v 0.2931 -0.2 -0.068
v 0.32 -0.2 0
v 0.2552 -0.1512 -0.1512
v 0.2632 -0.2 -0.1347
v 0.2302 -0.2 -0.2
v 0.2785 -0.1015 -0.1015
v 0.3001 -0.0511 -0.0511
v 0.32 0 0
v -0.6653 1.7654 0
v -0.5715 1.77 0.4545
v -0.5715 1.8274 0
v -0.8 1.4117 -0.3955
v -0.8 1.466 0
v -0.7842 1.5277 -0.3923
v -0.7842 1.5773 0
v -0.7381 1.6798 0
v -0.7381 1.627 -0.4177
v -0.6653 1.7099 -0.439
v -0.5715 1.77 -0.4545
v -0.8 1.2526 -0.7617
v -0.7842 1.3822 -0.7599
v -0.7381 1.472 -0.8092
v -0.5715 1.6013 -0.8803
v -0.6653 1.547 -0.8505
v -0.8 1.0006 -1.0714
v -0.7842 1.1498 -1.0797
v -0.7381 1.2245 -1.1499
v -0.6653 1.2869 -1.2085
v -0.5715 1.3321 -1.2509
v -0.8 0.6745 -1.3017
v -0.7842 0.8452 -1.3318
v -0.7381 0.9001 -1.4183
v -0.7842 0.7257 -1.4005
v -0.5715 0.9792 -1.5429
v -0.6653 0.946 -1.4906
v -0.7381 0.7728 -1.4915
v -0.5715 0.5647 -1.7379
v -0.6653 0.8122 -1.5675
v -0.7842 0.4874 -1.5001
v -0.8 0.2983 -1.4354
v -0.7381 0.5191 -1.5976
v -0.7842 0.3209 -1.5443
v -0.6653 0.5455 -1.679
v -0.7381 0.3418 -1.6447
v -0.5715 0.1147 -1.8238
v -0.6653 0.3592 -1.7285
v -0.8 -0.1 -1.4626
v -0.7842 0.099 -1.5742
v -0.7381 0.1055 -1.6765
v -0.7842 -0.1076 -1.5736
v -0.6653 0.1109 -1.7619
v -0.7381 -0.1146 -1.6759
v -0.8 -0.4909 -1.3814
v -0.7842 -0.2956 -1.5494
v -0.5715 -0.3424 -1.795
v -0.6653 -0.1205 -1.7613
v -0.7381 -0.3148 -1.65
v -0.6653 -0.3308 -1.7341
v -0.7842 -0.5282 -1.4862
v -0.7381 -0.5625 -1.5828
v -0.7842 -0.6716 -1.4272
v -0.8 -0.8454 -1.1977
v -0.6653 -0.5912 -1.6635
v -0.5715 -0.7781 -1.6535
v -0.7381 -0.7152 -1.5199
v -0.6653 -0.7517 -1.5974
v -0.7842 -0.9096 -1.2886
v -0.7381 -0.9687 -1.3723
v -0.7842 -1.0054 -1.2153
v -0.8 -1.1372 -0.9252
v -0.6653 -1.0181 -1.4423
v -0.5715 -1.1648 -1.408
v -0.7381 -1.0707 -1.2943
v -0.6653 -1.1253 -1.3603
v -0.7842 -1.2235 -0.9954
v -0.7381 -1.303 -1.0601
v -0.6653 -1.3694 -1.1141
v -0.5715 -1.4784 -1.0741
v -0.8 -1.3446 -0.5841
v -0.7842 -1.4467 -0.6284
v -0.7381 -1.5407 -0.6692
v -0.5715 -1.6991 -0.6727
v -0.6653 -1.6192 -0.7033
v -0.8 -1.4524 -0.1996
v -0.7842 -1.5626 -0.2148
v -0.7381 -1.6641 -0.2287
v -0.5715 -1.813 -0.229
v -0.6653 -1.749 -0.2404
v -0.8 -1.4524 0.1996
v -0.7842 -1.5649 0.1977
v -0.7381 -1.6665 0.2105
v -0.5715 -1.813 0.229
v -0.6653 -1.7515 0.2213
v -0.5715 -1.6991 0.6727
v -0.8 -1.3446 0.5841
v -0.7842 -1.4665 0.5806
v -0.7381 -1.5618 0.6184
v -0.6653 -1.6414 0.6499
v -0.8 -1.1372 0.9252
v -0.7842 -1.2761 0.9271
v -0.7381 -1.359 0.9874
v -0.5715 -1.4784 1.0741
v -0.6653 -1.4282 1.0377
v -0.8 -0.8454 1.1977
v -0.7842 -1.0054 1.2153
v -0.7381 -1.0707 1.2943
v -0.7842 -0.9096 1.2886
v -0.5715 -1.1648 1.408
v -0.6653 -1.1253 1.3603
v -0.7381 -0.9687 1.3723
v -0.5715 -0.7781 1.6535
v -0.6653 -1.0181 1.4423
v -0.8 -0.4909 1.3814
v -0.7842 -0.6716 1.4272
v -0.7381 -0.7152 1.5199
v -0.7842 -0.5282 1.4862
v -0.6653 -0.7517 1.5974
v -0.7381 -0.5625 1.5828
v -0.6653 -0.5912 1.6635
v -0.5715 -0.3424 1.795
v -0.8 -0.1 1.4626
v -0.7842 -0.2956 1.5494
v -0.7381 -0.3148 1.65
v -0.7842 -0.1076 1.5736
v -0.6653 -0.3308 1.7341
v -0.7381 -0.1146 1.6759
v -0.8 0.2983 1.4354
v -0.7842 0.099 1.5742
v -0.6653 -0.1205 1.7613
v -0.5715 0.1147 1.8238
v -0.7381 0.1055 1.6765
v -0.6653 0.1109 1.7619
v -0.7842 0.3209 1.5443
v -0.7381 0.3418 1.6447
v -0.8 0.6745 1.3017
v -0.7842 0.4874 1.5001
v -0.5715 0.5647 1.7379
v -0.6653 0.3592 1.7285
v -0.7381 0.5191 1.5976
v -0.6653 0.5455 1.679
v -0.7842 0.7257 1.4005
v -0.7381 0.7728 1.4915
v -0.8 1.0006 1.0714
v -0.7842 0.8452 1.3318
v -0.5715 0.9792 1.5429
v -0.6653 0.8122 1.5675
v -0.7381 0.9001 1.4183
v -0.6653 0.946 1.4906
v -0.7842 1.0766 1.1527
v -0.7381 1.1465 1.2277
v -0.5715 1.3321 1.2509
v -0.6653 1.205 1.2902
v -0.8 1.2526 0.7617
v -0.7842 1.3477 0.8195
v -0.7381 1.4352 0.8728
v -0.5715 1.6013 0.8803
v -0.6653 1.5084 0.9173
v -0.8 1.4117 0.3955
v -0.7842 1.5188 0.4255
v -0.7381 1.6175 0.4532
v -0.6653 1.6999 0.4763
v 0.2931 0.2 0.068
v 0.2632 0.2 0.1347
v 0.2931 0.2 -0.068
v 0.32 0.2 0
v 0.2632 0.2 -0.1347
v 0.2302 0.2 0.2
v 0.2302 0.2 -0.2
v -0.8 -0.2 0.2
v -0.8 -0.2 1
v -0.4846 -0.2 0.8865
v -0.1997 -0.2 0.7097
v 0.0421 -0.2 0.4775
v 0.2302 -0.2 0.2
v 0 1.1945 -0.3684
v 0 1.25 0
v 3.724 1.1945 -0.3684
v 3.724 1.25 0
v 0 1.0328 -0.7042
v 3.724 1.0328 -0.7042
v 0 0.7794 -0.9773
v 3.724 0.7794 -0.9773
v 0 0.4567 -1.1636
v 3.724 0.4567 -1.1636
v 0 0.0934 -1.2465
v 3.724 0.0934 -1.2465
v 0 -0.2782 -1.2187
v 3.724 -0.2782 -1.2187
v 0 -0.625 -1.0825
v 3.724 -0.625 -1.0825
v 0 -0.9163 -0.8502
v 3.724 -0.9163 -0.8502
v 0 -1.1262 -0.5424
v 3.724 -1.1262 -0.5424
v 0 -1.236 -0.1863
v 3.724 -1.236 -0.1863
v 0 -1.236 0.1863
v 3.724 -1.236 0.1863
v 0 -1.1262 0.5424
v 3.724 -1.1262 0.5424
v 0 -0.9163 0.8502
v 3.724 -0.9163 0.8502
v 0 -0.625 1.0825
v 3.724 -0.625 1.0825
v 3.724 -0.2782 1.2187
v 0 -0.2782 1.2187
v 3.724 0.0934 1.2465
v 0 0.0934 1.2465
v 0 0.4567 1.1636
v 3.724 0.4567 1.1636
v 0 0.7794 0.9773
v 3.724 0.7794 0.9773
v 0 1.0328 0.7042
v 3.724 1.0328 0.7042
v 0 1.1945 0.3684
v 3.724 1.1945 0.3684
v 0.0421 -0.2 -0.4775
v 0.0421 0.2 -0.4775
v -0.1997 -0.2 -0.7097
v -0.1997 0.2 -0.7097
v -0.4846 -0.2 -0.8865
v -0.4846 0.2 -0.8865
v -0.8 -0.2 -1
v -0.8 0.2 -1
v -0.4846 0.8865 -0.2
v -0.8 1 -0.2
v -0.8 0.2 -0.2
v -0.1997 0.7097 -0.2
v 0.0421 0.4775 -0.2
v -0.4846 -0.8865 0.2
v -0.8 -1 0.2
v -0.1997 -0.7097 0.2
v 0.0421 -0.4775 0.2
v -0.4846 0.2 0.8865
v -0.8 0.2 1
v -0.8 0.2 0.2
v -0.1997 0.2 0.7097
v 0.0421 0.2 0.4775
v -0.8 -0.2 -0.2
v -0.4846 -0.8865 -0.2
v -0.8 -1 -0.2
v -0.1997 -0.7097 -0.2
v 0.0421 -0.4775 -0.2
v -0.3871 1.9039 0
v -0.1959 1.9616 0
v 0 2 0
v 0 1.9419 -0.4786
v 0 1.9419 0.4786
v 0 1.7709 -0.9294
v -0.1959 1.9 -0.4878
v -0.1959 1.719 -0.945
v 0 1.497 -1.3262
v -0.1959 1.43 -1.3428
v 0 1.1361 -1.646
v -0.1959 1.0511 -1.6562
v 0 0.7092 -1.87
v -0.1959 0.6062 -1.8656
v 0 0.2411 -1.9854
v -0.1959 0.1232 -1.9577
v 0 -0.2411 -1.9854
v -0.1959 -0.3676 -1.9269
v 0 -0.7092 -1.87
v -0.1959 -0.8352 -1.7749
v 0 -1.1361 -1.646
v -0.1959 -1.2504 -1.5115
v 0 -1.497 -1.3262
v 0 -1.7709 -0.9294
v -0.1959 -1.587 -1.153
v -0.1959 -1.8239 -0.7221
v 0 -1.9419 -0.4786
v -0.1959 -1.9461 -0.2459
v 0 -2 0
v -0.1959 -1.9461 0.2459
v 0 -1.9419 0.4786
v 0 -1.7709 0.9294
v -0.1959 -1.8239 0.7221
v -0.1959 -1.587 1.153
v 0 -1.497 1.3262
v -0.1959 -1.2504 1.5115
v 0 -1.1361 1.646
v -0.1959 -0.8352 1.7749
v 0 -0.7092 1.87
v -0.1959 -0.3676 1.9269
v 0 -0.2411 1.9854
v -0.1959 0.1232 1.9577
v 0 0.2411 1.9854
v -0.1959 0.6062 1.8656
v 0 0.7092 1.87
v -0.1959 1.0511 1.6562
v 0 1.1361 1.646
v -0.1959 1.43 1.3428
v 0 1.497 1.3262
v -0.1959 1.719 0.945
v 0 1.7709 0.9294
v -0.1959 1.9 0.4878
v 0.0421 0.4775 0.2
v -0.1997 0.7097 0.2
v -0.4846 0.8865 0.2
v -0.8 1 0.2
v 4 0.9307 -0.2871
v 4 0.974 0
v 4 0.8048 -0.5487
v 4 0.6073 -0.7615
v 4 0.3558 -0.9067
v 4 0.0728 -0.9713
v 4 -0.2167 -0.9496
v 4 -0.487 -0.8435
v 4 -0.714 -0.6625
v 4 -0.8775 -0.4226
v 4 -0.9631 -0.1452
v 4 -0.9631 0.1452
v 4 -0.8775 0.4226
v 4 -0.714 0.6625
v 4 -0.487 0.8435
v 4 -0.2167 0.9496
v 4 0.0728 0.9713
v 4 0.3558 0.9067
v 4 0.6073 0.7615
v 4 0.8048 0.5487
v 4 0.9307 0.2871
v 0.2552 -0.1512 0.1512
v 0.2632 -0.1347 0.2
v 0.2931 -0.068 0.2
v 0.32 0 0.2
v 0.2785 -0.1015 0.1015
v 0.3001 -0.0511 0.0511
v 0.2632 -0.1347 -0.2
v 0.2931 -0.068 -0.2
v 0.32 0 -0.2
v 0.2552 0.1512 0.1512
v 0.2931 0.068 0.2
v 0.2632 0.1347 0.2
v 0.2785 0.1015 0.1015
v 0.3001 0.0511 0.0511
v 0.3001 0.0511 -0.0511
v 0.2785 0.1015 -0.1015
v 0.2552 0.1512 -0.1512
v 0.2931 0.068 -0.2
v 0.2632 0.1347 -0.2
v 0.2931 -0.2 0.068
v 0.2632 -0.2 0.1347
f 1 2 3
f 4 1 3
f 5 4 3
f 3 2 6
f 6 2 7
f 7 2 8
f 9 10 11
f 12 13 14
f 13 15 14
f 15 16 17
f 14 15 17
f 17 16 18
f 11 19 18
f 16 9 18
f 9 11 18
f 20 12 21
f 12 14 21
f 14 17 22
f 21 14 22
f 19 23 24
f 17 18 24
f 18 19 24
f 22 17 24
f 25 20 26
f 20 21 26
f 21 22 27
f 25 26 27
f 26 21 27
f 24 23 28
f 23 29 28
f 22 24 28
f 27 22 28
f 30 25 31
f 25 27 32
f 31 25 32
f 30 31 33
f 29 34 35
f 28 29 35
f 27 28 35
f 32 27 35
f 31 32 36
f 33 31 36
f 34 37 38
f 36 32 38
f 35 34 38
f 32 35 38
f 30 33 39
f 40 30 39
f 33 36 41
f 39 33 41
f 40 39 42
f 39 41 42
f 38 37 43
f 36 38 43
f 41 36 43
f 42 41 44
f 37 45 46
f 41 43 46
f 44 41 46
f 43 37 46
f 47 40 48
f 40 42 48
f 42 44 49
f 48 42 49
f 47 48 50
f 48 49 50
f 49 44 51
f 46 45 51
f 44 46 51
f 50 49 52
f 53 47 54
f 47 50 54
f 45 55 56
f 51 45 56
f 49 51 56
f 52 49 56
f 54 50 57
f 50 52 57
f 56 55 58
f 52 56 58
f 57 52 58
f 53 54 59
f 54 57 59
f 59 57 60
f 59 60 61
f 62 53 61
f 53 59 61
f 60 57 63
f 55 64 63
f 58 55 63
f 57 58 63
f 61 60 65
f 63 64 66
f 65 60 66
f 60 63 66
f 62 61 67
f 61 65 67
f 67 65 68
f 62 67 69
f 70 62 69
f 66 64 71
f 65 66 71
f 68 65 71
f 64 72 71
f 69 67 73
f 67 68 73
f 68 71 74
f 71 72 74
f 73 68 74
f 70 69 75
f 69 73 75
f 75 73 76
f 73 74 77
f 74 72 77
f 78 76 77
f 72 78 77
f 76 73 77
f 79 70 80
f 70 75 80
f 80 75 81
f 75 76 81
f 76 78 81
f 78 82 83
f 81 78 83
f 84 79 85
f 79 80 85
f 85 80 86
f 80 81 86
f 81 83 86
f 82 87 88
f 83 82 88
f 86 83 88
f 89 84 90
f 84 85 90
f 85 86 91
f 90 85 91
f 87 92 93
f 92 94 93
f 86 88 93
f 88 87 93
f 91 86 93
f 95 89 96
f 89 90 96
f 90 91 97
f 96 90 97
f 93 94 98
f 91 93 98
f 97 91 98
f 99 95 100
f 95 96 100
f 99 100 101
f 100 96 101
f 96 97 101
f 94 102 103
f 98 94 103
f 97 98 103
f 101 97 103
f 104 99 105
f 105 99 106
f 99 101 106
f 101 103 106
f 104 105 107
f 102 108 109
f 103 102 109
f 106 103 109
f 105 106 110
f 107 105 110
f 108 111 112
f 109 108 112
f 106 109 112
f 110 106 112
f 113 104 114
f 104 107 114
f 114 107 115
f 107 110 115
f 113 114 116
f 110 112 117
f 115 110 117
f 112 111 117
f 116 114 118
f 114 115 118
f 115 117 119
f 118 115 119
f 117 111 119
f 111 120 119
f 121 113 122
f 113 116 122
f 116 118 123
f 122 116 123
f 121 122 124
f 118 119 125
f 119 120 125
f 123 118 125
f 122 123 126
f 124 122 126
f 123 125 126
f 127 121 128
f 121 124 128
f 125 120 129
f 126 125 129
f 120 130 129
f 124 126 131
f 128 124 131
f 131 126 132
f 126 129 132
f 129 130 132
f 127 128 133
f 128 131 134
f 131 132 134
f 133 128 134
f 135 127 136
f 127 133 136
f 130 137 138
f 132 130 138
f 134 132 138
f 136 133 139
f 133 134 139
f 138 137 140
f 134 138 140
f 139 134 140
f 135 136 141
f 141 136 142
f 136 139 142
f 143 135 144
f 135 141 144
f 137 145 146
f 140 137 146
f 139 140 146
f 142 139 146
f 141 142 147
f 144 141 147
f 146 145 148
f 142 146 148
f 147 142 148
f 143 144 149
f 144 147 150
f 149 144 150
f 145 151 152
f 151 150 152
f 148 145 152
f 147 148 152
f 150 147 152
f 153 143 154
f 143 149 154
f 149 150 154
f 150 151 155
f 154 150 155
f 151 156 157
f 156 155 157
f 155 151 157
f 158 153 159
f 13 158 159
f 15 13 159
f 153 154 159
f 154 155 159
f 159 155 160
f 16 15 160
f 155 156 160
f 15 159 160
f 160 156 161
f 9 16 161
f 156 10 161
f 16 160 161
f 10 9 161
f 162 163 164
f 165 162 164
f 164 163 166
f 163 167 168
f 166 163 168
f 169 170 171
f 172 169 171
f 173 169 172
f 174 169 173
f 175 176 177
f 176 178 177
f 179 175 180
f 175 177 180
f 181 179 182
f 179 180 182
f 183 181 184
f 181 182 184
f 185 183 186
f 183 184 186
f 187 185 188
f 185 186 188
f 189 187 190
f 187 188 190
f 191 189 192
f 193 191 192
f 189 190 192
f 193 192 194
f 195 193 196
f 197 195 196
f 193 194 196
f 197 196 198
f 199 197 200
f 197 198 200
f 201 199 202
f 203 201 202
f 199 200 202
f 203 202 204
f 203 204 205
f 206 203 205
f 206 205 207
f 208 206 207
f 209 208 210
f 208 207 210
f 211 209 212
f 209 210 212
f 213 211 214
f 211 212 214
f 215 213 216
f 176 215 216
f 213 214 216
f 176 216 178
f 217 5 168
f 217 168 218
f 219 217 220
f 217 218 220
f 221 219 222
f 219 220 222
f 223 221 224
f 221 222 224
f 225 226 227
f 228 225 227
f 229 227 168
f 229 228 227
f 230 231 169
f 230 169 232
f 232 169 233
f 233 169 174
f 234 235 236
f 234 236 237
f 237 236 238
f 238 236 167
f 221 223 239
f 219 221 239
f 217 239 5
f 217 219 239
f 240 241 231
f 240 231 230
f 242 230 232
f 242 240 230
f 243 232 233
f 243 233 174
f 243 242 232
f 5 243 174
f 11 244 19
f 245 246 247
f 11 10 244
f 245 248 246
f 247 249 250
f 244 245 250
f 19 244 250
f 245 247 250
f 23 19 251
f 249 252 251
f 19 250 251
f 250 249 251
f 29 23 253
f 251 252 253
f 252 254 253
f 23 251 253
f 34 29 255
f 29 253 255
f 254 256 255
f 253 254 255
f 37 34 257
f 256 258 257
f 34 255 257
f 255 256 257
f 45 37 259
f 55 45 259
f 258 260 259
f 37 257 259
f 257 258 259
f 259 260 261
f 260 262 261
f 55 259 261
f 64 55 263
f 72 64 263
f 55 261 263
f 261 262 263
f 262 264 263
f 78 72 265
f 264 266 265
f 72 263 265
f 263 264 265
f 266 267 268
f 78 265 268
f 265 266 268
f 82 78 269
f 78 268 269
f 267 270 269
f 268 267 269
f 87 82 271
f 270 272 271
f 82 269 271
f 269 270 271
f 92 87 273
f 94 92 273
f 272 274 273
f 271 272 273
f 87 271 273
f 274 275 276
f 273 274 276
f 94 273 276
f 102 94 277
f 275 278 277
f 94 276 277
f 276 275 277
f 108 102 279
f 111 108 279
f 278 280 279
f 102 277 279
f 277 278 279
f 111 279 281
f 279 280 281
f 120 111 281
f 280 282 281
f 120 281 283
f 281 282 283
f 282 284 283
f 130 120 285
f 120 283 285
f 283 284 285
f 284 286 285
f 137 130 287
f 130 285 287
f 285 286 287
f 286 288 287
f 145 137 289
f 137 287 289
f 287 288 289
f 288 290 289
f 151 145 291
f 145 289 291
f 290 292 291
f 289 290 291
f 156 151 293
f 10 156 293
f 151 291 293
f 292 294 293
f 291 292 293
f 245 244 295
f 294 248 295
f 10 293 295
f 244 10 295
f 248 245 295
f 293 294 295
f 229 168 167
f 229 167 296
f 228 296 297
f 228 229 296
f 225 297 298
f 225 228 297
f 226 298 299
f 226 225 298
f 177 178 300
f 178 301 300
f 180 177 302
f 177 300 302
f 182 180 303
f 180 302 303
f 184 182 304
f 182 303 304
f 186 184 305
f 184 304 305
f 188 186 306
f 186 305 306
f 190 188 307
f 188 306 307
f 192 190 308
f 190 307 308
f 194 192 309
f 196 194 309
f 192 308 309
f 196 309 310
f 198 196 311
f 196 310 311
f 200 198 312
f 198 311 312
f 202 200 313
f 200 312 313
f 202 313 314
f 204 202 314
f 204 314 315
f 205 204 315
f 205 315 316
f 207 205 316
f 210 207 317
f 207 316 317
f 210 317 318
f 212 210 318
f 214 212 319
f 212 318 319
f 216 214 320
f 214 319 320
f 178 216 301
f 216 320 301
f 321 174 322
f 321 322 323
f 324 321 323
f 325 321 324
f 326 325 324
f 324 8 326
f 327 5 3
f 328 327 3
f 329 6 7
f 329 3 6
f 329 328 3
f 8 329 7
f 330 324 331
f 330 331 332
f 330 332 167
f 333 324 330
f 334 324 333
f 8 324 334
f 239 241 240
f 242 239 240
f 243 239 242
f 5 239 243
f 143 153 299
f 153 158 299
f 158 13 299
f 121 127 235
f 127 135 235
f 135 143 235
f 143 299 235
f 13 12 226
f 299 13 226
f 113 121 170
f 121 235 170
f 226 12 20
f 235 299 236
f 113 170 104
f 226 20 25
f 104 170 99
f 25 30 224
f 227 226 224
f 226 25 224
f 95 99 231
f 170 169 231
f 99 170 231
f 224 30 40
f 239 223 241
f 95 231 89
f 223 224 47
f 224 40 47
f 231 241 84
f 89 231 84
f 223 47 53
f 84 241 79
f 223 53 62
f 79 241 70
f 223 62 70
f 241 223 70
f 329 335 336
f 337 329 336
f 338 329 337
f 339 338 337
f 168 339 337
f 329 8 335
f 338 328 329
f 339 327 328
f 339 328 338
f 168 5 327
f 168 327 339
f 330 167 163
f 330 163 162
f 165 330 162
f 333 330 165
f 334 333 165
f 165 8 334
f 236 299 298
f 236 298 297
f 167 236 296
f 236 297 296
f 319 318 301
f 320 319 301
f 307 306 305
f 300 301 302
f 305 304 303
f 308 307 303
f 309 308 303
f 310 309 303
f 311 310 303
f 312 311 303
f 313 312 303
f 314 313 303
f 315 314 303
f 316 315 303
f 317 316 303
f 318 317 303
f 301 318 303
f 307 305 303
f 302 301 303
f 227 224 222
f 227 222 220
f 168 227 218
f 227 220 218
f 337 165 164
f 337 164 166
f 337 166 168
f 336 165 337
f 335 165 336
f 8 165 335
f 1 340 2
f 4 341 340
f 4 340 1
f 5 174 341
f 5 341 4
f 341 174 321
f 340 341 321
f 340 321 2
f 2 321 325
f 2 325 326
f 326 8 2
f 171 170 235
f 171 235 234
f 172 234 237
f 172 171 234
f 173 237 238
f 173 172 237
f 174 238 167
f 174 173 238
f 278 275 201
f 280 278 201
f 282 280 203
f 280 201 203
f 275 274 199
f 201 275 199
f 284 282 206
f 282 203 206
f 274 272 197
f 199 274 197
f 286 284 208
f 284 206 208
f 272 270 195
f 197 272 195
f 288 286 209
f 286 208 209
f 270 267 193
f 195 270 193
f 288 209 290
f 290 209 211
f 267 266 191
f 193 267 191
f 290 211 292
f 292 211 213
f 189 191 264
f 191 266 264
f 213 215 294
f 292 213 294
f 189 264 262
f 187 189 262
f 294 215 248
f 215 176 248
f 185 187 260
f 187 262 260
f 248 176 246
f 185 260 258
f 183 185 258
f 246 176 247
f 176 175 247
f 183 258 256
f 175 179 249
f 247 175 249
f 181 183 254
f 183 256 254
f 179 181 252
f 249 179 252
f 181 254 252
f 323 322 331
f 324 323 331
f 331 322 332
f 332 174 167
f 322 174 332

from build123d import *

# Parameters (mm, degrees)
CUT_EXTRUDE1_DEPTH      = 0.2
CUT_EXTRUDE1_DEPTH_BACK = 0.2
CUT_EXTRUDE2_DEPTH      = 0.2
CUT_EXTRUDE2_DEPTH_BACK = 0.2


with BuildPart() as part:
    # Sketch1 → Revolve1 (revolve)
    with BuildSketch(Plane.XY):
        with BuildLine():
            Line((-0.8, 0), (-0.8, 1.46601855))
            ThreePointArc((-0.8, 1.46601855), (-0.738085774, 1.679789478), (-0.571509952, 1.827383098))
            ThreePointArc((-0.571509952, 1.827383098), (-0.29223212, 1.93513645), (0, 2))
            Line((0, 2), (0, 1.25))
            Line((0, 1.25), (3.724, 1.25))
            Line((3.724, 1.25), (4, 0.974))
            Line((4, 0.974), (4, 0))
            Line((4, 0), (-0.8, 0))
        make_face()
    revolve(axis=Axis((4, 0, 0), (-1, 0, 0)))

    # Sketch2 → Cut-Extrude1 (cut, two sides: drawn at the far end of the back side and taken through both)
    with BuildSketch(Plane.XY.offset(-CUT_EXTRUDE1_DEPTH_BACK)):
        with BuildLine():
            Line((-0.8, 1), (-0.8, -1))
            ThreePointArc((-0.8, -1), (-0.115415221, -0.639534952), (0.32, 0))
            ThreePointArc((0.32, 0), (-0.115415221, 0.639534952), (-0.8, 1))
        make_face()
    extrude(amount=CUT_EXTRUDE1_DEPTH + CUT_EXTRUDE1_DEPTH_BACK, mode=Mode.SUBTRACT)

    # Sketch3 → Cut-Extrude2 (cut, two sides: drawn at the far end of the back side and taken through both)
    with BuildSketch(Plane(origin=(0, 0, 0), x_dir=(1, 0, 0), z_dir=(0, 1, 0)).offset(-CUT_EXTRUDE2_DEPTH_BACK)):
        with BuildLine():
            Line((-0.8, 1), (-0.8, -1))
            ThreePointArc((-0.8, -1), (-0.115415221, -0.639534952), (0.32, 0))
            ThreePointArc((0.32, 0), (-0.115415221, 0.639534952), (-0.8, 1))
        make_face()
    extrude(amount=CUT_EXTRUDE2_DEPTH + CUT_EXTRUDE2_DEPTH_BACK, mode=Mode.SUBTRACT)


solid = part.part
